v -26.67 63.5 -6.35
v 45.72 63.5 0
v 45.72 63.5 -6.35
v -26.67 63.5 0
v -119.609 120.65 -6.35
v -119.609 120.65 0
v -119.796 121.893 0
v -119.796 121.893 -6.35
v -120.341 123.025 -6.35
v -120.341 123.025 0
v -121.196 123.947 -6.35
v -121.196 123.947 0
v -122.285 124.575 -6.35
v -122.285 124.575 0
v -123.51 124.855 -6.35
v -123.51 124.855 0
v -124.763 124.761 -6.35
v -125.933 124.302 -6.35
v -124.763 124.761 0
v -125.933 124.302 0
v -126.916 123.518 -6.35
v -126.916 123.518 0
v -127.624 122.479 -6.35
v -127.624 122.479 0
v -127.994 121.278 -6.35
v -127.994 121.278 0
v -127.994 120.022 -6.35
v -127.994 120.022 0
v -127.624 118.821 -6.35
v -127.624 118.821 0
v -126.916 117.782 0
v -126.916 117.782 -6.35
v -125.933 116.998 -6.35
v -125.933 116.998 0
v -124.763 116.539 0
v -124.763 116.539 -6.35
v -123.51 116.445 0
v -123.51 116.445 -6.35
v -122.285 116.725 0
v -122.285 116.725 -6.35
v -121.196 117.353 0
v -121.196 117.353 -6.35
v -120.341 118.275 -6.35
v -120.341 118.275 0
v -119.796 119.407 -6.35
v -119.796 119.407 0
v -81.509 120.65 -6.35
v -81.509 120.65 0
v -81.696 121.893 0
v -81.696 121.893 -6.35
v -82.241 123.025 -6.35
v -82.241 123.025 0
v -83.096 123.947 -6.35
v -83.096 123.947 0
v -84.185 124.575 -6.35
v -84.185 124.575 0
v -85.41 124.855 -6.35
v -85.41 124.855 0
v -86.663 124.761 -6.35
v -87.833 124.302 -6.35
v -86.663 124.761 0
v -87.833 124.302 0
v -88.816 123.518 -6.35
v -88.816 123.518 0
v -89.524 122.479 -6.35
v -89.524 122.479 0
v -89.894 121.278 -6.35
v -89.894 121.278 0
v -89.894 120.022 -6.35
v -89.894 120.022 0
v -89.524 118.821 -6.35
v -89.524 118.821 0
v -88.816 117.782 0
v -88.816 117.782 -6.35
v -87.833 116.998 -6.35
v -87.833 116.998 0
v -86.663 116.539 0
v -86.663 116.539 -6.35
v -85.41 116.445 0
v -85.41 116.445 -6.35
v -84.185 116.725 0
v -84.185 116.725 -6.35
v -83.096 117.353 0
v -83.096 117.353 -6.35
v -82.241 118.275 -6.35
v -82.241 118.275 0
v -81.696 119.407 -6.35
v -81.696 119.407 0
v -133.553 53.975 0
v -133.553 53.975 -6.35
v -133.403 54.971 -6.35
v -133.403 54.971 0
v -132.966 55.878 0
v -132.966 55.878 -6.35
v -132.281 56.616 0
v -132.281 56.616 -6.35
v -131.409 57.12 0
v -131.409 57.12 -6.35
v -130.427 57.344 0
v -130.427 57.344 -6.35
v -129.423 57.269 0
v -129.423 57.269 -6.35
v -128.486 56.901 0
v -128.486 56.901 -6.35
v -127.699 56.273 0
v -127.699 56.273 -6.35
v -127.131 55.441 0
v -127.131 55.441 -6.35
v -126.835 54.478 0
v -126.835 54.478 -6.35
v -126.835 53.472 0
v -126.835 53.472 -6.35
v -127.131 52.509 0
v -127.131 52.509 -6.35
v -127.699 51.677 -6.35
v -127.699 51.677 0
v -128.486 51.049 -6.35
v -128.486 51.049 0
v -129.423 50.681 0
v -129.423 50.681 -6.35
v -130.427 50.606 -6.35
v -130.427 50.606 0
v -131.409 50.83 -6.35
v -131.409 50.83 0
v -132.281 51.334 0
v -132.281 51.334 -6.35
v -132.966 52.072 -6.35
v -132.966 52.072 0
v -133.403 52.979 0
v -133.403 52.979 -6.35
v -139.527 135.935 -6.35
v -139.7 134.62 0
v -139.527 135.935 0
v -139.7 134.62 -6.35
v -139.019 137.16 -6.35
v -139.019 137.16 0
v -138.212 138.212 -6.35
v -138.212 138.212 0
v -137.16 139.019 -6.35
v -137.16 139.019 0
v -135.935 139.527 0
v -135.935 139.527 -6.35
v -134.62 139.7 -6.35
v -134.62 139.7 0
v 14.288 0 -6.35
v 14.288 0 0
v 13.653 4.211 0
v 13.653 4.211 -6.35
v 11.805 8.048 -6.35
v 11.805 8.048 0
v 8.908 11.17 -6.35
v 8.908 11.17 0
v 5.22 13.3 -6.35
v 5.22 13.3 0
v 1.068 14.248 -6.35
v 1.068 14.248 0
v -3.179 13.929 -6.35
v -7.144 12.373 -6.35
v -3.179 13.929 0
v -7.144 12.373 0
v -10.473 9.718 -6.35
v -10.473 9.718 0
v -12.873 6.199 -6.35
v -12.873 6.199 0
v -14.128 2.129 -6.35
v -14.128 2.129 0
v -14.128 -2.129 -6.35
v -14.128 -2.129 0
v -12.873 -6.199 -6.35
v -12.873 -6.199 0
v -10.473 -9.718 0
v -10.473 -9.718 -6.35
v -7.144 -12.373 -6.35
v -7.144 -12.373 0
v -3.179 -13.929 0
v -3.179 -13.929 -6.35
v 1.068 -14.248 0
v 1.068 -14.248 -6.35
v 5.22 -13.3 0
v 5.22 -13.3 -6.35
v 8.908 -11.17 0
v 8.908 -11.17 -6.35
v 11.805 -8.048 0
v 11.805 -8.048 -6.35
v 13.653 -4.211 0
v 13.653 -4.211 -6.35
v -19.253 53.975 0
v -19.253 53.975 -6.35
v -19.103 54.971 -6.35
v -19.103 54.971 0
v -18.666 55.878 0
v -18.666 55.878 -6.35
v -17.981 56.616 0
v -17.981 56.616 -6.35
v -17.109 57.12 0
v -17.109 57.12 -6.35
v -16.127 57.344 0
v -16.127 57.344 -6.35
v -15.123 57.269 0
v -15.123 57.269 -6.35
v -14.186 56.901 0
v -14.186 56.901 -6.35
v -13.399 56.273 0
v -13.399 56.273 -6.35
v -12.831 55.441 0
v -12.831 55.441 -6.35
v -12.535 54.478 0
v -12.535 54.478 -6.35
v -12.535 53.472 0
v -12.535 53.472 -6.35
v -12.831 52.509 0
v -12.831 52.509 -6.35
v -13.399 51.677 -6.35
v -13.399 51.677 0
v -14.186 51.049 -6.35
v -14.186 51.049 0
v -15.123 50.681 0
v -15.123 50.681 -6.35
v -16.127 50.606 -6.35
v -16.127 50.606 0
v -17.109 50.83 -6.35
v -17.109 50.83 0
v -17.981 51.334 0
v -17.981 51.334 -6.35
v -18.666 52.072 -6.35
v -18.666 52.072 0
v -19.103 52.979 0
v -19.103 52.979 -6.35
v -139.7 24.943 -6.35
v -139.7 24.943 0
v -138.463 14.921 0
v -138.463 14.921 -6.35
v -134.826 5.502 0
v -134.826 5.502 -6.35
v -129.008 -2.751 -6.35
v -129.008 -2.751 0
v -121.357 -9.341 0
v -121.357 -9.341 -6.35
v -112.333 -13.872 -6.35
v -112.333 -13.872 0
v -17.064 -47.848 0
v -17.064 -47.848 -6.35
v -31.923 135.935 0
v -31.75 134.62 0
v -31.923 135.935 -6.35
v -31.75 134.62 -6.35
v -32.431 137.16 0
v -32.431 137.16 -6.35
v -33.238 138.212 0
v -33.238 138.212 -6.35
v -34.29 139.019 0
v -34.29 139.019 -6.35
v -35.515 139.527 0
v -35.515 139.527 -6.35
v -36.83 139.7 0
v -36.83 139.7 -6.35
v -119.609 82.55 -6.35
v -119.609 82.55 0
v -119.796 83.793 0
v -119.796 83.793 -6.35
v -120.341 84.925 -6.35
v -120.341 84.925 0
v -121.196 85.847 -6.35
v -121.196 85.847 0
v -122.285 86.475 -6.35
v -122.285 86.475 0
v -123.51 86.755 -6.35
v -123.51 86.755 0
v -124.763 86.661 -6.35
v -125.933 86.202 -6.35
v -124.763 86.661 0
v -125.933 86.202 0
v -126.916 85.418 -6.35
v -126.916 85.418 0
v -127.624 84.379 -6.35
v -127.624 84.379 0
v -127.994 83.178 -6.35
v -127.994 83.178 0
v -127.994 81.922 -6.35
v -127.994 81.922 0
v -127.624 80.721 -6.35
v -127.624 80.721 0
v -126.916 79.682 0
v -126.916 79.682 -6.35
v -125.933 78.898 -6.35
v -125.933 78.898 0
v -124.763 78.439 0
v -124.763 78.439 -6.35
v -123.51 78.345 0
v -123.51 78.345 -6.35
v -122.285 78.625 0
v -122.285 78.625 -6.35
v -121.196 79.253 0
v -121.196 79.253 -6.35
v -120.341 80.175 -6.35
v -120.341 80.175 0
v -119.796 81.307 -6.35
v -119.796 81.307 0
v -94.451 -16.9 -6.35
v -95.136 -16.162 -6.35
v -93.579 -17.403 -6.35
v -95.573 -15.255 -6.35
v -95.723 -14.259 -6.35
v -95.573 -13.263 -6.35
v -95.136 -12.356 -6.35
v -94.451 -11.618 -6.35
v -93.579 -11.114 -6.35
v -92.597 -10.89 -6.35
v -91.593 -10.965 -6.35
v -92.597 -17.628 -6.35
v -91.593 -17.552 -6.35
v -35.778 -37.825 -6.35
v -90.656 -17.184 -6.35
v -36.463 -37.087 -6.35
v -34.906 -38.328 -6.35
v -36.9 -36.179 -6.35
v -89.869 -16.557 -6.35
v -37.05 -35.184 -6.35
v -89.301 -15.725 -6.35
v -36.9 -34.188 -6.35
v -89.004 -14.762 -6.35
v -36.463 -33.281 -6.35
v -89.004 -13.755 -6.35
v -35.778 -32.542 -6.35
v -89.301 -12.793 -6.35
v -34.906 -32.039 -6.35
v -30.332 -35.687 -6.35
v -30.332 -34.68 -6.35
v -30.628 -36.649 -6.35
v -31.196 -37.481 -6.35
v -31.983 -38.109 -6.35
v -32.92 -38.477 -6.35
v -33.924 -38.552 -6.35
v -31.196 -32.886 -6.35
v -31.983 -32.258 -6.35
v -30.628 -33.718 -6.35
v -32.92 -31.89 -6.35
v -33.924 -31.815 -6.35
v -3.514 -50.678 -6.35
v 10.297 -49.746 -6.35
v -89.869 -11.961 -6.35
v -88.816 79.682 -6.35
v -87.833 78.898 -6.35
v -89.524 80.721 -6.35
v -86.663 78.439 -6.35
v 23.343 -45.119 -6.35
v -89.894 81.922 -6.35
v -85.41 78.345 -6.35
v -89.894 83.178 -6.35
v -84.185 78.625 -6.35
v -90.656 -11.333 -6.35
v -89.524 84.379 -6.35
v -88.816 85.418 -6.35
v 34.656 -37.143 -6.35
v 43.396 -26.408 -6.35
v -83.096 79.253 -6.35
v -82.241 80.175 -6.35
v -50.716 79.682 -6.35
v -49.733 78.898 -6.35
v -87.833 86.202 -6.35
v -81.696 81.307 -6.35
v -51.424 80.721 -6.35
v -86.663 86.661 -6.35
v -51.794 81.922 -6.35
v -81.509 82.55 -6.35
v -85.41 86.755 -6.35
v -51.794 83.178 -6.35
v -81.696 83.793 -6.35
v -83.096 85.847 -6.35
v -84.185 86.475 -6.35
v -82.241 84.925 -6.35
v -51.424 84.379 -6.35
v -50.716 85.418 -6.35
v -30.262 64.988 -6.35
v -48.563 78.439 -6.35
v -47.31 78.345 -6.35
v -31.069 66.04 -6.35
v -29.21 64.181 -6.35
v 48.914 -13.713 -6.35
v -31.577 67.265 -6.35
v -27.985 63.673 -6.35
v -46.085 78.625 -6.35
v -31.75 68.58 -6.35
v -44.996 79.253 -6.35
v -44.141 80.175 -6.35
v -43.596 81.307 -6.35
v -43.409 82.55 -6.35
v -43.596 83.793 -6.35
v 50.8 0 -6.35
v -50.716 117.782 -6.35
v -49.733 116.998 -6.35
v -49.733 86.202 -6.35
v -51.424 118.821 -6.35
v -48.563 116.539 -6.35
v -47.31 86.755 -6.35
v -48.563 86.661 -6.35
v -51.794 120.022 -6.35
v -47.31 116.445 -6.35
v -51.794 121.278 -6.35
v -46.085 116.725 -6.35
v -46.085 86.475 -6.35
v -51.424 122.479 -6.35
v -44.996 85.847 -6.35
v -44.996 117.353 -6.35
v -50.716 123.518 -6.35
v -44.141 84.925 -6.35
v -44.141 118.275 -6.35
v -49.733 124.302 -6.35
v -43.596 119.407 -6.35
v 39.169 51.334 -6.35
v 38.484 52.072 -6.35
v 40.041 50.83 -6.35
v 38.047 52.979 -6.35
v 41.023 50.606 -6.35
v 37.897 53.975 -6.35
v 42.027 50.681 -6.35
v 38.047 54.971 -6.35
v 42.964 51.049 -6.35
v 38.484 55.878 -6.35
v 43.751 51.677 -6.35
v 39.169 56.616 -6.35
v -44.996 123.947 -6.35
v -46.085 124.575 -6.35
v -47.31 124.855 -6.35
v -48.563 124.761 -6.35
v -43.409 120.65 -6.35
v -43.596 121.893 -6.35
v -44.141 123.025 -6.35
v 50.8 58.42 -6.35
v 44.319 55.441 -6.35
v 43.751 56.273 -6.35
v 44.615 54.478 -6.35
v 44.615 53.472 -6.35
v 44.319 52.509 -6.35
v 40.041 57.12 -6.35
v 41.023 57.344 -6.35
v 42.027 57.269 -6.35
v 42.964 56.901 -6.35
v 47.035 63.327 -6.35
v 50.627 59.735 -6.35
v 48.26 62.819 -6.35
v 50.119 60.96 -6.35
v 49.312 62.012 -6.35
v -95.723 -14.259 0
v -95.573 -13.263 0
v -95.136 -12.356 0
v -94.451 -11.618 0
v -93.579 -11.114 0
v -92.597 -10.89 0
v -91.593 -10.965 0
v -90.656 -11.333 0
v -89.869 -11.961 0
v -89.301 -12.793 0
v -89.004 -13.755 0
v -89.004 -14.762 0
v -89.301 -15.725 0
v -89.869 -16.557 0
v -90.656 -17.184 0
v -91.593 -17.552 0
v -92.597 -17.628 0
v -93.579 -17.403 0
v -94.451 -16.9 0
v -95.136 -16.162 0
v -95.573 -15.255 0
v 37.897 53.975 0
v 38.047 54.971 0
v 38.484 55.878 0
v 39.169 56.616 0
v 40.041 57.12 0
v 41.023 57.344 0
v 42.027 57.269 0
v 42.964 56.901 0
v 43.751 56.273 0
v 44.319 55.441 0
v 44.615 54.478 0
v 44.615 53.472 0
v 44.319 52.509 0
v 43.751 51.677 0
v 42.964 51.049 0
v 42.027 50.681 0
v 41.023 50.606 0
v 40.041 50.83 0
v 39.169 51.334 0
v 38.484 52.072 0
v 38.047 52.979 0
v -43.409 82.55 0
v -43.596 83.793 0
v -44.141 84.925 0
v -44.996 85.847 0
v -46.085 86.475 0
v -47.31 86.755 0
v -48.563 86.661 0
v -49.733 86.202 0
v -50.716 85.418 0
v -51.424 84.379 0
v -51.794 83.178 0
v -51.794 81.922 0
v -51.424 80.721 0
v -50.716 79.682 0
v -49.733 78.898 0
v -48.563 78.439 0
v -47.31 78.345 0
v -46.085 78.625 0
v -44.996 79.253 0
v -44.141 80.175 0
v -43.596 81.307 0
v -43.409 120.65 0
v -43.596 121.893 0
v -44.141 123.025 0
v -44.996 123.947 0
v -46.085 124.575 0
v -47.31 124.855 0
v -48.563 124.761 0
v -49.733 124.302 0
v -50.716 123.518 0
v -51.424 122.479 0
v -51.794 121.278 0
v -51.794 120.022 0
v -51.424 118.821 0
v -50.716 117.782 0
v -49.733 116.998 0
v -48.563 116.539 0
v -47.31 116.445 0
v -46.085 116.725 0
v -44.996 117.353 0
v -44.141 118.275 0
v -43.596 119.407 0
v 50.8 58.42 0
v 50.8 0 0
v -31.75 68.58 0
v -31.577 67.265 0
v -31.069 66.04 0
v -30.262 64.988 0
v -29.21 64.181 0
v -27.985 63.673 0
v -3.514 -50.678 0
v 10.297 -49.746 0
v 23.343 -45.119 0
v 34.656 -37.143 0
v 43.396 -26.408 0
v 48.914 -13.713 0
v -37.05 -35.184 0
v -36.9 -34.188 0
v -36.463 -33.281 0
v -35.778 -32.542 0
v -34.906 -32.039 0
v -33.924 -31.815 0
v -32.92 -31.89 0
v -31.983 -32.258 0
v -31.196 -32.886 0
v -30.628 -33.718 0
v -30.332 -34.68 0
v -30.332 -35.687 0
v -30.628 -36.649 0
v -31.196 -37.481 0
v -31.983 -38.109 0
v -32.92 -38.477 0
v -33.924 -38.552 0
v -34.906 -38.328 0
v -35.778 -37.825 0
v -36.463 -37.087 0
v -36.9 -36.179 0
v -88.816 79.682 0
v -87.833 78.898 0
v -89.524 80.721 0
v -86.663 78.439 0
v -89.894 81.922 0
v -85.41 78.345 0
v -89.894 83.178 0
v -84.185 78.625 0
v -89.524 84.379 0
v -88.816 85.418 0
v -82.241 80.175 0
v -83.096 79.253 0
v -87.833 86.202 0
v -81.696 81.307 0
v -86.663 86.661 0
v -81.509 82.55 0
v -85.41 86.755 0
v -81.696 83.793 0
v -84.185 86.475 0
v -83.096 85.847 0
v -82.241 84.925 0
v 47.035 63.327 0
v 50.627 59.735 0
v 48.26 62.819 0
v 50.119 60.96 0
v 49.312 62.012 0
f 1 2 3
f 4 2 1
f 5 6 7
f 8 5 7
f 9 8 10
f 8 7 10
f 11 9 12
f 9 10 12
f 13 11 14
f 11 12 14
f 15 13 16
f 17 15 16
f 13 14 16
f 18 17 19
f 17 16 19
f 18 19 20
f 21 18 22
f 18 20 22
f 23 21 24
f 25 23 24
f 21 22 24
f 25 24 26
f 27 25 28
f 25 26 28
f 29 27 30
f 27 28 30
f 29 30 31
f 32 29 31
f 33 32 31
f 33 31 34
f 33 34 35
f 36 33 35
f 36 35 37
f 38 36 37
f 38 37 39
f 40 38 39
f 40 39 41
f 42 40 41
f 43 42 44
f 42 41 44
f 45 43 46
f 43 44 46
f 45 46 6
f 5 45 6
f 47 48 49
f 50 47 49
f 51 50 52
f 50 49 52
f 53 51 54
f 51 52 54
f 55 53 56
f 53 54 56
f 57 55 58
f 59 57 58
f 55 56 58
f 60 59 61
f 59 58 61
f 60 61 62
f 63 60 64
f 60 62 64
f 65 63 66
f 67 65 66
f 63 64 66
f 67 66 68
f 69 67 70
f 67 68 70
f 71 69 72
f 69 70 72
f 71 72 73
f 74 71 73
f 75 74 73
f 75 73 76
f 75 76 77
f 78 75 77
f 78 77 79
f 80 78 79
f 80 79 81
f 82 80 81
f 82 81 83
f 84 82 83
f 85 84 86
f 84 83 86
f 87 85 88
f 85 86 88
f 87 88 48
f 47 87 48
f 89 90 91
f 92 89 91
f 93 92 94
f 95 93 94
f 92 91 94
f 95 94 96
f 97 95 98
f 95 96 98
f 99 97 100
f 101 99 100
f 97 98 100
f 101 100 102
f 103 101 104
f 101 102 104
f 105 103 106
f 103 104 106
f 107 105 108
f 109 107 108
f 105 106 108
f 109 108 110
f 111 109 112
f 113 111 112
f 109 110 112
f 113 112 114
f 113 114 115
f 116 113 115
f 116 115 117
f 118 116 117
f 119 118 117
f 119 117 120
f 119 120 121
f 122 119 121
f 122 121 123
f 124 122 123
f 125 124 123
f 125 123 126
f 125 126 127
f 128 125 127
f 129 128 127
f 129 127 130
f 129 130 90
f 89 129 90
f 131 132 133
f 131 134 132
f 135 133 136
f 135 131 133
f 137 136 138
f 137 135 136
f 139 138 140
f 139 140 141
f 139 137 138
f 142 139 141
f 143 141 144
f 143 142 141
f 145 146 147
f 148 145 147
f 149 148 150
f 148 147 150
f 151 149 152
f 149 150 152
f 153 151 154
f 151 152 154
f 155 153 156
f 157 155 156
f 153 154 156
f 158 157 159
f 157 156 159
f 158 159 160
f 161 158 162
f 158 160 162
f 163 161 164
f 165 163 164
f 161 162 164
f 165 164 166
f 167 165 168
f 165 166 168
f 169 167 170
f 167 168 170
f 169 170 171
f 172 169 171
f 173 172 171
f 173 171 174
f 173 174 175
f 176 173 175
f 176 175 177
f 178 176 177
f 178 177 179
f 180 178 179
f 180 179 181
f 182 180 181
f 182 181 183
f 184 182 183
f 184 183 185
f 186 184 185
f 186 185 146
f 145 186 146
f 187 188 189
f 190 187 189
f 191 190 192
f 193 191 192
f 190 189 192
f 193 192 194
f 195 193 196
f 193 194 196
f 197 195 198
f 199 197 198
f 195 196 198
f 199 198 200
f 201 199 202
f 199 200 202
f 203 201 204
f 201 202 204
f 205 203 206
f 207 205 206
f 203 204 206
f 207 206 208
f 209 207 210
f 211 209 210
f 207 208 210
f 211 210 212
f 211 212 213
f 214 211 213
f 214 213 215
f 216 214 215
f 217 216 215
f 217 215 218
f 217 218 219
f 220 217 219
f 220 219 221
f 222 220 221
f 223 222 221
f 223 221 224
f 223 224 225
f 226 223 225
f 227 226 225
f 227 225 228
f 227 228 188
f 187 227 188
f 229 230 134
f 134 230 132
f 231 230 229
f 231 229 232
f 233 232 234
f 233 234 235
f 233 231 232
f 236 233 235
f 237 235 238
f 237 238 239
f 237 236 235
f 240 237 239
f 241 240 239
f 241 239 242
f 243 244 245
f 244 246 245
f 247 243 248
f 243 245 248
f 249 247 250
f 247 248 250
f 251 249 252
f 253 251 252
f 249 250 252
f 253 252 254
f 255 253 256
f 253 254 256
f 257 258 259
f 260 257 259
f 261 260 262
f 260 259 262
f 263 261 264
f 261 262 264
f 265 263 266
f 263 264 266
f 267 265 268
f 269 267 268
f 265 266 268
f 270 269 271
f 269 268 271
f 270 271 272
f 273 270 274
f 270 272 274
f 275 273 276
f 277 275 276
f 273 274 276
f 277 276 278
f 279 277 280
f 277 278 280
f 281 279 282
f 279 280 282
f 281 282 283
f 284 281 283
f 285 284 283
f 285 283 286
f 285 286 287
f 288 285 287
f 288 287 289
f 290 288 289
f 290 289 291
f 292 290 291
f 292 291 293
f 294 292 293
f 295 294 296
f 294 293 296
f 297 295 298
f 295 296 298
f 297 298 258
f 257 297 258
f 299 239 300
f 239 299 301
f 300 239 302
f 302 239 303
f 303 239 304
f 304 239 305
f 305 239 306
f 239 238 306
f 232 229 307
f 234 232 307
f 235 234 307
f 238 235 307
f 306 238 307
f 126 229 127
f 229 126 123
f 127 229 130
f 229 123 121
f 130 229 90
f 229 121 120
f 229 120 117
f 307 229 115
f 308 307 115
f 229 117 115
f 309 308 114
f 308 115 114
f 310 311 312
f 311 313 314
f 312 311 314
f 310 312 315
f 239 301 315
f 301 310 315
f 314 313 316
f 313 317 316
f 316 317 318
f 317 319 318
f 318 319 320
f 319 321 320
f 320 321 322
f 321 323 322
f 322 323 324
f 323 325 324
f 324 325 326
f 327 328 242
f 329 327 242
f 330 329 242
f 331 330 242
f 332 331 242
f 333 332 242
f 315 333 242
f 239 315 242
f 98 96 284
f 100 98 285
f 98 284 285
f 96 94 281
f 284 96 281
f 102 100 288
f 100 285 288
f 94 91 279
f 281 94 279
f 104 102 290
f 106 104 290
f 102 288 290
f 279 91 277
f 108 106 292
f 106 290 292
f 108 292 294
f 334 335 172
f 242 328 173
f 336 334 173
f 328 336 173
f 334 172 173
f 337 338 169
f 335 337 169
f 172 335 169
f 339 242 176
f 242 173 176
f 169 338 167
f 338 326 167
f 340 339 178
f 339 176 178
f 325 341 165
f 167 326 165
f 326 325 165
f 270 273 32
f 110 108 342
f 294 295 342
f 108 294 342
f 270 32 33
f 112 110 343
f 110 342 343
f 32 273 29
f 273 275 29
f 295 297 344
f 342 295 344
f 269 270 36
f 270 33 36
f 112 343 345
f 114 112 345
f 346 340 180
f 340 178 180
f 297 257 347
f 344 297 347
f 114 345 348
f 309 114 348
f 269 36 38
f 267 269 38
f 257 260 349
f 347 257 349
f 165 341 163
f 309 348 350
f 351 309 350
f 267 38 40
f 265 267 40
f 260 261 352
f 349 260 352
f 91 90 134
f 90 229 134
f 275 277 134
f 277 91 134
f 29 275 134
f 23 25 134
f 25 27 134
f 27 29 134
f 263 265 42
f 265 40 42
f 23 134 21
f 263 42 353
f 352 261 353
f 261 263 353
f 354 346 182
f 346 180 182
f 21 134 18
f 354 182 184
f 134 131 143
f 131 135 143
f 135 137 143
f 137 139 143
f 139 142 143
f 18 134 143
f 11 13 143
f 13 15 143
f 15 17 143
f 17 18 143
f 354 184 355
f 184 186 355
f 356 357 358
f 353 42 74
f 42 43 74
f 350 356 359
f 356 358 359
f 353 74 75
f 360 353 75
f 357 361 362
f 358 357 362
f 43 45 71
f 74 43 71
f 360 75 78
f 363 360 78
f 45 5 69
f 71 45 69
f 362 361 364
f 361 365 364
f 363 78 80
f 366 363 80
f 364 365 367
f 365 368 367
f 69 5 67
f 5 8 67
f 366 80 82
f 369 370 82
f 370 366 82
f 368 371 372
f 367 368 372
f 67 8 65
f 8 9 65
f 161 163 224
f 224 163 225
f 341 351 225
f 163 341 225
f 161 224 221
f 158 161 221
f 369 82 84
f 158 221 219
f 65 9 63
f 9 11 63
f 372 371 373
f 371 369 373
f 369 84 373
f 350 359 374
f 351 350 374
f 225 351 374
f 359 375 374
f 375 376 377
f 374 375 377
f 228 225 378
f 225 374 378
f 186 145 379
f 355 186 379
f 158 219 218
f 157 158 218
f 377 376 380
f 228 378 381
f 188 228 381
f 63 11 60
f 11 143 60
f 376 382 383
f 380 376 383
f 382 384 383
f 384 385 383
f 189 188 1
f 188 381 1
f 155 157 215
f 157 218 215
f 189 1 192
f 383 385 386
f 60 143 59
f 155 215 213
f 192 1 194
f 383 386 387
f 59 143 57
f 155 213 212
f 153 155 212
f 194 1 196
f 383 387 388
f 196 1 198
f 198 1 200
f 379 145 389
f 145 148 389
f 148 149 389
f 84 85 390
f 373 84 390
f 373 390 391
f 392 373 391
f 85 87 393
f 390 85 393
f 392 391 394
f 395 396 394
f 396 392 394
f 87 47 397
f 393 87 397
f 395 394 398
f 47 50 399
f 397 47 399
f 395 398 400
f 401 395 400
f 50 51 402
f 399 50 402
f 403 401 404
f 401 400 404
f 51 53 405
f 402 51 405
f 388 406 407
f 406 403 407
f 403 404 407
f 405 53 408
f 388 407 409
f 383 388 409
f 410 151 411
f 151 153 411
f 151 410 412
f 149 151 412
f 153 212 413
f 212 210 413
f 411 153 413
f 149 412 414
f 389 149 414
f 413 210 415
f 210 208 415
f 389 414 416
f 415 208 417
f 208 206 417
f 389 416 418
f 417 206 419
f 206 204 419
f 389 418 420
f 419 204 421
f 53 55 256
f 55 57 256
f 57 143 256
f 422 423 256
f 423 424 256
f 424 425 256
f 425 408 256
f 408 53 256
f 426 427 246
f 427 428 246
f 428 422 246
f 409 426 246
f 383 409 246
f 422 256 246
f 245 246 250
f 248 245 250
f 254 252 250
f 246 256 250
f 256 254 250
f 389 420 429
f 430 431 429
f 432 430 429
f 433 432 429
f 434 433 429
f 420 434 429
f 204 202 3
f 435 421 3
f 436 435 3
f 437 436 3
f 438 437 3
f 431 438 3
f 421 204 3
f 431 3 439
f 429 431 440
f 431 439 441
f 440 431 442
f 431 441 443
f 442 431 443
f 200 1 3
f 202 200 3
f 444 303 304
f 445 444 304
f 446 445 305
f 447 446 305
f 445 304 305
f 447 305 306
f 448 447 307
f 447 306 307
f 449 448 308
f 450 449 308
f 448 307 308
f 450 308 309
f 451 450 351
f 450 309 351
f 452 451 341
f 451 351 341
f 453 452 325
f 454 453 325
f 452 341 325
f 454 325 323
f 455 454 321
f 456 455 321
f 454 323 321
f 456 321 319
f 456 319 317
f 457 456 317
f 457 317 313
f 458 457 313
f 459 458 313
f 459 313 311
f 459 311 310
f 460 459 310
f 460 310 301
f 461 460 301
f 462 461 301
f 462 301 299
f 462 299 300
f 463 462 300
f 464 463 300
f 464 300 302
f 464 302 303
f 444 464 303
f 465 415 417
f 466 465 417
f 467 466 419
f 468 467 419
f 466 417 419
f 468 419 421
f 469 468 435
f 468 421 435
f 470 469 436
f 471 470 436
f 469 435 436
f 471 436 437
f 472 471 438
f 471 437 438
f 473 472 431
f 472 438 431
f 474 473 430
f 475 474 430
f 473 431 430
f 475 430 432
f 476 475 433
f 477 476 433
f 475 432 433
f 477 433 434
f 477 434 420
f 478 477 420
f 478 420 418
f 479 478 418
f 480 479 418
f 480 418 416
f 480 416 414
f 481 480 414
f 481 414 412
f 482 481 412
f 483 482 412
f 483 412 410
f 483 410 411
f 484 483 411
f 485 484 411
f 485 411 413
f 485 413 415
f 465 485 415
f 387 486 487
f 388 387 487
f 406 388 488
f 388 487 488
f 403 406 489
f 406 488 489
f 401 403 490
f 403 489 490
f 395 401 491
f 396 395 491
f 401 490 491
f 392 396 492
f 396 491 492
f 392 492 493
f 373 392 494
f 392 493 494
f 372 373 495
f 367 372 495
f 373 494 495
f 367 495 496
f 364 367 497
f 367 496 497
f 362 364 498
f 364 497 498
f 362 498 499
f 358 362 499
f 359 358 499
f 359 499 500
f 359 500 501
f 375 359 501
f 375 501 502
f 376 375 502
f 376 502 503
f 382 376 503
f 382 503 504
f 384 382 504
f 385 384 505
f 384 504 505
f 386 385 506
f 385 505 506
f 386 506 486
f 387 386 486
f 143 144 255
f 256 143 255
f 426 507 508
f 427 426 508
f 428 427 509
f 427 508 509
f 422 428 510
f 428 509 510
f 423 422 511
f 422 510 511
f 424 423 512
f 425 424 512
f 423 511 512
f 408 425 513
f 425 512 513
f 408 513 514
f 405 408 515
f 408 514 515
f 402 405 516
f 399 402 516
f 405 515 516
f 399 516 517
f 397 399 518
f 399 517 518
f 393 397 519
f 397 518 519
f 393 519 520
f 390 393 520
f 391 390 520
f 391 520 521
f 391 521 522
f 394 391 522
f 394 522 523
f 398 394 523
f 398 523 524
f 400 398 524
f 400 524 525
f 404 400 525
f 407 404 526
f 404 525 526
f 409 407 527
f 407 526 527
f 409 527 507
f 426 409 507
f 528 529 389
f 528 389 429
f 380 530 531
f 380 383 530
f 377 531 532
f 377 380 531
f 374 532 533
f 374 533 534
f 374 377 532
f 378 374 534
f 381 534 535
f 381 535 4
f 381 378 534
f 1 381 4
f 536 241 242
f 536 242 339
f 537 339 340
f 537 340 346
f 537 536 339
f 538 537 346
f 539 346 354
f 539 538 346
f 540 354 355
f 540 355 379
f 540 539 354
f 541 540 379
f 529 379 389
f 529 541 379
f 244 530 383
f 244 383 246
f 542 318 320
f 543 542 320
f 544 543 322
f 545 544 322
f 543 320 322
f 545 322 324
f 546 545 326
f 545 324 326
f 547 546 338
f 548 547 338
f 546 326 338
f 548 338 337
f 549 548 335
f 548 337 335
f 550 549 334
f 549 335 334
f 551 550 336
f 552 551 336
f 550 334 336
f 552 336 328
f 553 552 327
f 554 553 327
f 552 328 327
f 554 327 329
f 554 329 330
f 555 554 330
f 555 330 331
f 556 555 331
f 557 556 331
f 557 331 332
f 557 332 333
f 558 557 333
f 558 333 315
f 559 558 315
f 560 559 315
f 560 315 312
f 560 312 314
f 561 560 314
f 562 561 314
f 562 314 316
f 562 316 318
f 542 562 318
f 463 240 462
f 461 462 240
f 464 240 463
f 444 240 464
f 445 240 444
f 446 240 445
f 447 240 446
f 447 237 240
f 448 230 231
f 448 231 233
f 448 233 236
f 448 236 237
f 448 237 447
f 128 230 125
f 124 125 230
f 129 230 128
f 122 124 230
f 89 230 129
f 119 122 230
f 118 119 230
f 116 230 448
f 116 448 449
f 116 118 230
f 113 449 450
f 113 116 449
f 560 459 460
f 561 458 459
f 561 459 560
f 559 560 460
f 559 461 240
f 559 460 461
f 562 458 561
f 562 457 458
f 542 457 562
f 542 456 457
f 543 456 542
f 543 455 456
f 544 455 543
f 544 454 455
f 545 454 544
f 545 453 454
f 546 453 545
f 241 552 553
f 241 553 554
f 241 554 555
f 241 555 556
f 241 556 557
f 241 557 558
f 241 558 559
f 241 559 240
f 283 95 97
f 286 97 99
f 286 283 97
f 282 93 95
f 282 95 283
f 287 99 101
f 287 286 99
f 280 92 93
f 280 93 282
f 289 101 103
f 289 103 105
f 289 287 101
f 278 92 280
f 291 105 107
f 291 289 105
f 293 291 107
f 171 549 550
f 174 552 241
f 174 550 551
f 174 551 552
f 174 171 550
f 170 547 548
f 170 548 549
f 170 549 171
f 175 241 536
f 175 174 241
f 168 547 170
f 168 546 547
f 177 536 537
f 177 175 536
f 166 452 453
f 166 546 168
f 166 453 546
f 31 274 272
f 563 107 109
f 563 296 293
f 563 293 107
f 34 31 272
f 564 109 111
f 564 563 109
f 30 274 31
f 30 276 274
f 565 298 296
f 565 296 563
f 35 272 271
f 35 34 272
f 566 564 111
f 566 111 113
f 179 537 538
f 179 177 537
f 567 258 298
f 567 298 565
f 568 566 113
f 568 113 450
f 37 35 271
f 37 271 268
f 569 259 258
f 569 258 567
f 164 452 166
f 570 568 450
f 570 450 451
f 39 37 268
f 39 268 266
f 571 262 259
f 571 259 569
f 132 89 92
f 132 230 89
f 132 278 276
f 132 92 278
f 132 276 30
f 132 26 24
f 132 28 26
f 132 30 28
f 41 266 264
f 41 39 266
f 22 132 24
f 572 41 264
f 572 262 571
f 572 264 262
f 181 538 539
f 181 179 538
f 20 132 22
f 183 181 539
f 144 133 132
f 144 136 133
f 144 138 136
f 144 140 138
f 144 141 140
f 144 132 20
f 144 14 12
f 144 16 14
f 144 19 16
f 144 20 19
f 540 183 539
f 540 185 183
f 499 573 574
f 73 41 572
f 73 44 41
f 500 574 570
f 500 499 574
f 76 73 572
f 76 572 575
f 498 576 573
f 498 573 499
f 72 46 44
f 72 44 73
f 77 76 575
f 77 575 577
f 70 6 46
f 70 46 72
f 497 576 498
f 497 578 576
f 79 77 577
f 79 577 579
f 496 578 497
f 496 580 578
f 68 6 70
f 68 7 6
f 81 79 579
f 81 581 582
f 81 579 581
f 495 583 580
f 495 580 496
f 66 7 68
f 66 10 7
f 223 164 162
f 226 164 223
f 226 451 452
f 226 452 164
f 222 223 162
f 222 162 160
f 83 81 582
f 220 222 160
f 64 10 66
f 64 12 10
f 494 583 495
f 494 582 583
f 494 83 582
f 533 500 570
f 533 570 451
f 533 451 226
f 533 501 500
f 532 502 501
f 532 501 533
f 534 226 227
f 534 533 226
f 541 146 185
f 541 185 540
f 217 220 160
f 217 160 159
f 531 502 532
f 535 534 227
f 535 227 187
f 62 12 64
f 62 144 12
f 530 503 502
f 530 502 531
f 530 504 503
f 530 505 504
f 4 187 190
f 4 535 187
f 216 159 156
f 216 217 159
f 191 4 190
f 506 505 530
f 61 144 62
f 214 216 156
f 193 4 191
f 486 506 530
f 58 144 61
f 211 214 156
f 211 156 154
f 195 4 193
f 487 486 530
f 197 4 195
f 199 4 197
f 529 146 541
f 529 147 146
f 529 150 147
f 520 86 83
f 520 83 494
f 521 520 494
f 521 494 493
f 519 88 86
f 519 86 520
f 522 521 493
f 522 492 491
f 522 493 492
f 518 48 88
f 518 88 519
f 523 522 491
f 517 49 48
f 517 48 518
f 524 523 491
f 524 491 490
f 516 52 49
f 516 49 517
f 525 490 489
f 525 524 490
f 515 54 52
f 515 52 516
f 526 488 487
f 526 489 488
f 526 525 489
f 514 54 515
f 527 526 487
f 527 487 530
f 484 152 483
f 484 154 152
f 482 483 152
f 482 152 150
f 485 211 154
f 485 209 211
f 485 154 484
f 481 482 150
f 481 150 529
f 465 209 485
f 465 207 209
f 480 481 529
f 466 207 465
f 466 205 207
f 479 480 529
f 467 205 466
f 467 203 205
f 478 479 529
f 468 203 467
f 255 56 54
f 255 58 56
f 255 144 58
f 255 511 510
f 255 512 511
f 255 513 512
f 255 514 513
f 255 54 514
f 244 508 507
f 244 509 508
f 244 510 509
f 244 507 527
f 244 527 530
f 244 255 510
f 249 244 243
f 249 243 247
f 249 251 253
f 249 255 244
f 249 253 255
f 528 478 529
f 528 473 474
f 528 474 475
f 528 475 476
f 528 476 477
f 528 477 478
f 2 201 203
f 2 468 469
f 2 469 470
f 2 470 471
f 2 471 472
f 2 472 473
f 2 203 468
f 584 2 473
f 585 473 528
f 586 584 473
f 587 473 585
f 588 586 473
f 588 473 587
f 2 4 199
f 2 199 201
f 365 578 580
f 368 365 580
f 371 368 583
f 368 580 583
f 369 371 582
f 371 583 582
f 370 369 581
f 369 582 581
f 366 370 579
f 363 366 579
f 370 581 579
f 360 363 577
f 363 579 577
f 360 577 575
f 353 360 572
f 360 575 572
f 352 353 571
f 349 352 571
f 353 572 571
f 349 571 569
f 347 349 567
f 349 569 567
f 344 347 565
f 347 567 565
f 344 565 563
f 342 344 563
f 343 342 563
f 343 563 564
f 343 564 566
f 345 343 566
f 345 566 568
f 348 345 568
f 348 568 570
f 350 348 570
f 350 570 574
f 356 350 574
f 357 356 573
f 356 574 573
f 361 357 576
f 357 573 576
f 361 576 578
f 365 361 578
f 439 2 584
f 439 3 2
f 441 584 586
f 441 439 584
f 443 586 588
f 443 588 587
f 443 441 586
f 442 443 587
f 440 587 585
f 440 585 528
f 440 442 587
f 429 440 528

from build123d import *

# Parameters (mm, degrees)
BOSS_EXTRUDE1_DEPTH     = 6.35
SKETCH3_W               = 107.95
SKETCH3_H               = 76.2
BOSS_EXTRUDE2_DEPTH     = 6.35
FILLET1_R               = 5.08
CUT_EXTRUDE1_REACH      = 199.668
SKETCH4_R               = 14.2875
F_1_4_CLEARANCE_HOLE1_D = 6.7564
SKETCH12_R              = 4.2164
CUT_EXTRUDE2_DEPTH      = 6.35


with BuildPart() as part:
    # Sketch2 → Boss-Extrude1 (new body)
    with BuildSketch(Plane.XY):
        with BuildLine():
            Line((50.8, 63.5), (-139.7, 63.5))
            Line((-139.7, 63.5), (-139.7, 24.9428))
            ThreePointArc((-139.7, 24.9428), (-132.170466199, 1.196645543), (-112.333373337, -13.871980059))
            Line((-112.333373337, -13.871980059), (-17.064303956, -47.848192552))
            ThreePointArc((-17.064303956, -47.848192552), (29.272626795, -41.518108344), (50.8, 0))
            Line((50.8, 0), (50.8, 63.5))
        make_face()
    extrude(amount=-BOSS_EXTRUDE1_DEPTH)

    # Sketch3 → Boss-Extrude2 (add)
    with BuildSketch(Plane.XY):
        with Locations((-85.725, 101.6)):
            Rectangle(SKETCH3_W, SKETCH3_H)
    extrude(amount=-BOSS_EXTRUDE2_DEPTH)

    # Fillet1
    fillet1_edges = [part.edges().sort_by_distance(p)[0] for p in [
        (50.8, 63.5, -3.175),
        (-31.75, 139.7, -3.175),
        (-139.7, 139.7, -3.175),
        (-31.75, 63.5, -3.175),
    ]]
    fillet(fillet1_edges, radius=FILLET1_R)

    # Sketch4 → Cut-Extrude1 (cut, up to next)
    with BuildSketch(Plane.XY, mode=Mode.PRIVATE) as cut_extrude1_sk1:
        Circle(SKETCH4_R)
    cut_extrude1_tool1 = extrude(cut_extrude1_sk1.sketch, amount=-CUT_EXTRUDE1_REACH, mode=Mode.PRIVATE) & part.part
    add(cut_extrude1_tool1.solids().sort_by_distance((0, 0, 0))[0], mode=Mode.SUBTRACT)

    # 1/4 Clearance Hole1 (through all)
    with Locations(Plane.XY):
        with Locations((-33.671992271, -35.183583732), (-92.344956452, -14.258795534), (-130.175, 53.975), (-15.875, 53.975), (41.275, 53.975)):
            Hole(F_1_4_CLEARANCE_HOLE1_D / 2)

    # Sketch12 → Cut-Extrude2 (cut)
    with BuildSketch(Plane.XY):
        with Locations((-123.825, 120.65)):
            Circle(SKETCH12_R)
        with Locations((-123.825, 82.55)):
            Circle(SKETCH12_R)
        with Locations((-85.725, 120.65)):
            Circle(SKETCH12_R)
        with Locations((-85.725, 82.55)):
            Circle(SKETCH12_R)
        with Locations((-47.625, 82.55)):
            Circle(SKETCH12_R)
        with Locations((-47.625, 120.65)):
            Circle(SKETCH12_R)
    extrude(amount=-CUT_EXTRUDE2_DEPTH, mode=Mode.SUBTRACT)


solid = part.part
